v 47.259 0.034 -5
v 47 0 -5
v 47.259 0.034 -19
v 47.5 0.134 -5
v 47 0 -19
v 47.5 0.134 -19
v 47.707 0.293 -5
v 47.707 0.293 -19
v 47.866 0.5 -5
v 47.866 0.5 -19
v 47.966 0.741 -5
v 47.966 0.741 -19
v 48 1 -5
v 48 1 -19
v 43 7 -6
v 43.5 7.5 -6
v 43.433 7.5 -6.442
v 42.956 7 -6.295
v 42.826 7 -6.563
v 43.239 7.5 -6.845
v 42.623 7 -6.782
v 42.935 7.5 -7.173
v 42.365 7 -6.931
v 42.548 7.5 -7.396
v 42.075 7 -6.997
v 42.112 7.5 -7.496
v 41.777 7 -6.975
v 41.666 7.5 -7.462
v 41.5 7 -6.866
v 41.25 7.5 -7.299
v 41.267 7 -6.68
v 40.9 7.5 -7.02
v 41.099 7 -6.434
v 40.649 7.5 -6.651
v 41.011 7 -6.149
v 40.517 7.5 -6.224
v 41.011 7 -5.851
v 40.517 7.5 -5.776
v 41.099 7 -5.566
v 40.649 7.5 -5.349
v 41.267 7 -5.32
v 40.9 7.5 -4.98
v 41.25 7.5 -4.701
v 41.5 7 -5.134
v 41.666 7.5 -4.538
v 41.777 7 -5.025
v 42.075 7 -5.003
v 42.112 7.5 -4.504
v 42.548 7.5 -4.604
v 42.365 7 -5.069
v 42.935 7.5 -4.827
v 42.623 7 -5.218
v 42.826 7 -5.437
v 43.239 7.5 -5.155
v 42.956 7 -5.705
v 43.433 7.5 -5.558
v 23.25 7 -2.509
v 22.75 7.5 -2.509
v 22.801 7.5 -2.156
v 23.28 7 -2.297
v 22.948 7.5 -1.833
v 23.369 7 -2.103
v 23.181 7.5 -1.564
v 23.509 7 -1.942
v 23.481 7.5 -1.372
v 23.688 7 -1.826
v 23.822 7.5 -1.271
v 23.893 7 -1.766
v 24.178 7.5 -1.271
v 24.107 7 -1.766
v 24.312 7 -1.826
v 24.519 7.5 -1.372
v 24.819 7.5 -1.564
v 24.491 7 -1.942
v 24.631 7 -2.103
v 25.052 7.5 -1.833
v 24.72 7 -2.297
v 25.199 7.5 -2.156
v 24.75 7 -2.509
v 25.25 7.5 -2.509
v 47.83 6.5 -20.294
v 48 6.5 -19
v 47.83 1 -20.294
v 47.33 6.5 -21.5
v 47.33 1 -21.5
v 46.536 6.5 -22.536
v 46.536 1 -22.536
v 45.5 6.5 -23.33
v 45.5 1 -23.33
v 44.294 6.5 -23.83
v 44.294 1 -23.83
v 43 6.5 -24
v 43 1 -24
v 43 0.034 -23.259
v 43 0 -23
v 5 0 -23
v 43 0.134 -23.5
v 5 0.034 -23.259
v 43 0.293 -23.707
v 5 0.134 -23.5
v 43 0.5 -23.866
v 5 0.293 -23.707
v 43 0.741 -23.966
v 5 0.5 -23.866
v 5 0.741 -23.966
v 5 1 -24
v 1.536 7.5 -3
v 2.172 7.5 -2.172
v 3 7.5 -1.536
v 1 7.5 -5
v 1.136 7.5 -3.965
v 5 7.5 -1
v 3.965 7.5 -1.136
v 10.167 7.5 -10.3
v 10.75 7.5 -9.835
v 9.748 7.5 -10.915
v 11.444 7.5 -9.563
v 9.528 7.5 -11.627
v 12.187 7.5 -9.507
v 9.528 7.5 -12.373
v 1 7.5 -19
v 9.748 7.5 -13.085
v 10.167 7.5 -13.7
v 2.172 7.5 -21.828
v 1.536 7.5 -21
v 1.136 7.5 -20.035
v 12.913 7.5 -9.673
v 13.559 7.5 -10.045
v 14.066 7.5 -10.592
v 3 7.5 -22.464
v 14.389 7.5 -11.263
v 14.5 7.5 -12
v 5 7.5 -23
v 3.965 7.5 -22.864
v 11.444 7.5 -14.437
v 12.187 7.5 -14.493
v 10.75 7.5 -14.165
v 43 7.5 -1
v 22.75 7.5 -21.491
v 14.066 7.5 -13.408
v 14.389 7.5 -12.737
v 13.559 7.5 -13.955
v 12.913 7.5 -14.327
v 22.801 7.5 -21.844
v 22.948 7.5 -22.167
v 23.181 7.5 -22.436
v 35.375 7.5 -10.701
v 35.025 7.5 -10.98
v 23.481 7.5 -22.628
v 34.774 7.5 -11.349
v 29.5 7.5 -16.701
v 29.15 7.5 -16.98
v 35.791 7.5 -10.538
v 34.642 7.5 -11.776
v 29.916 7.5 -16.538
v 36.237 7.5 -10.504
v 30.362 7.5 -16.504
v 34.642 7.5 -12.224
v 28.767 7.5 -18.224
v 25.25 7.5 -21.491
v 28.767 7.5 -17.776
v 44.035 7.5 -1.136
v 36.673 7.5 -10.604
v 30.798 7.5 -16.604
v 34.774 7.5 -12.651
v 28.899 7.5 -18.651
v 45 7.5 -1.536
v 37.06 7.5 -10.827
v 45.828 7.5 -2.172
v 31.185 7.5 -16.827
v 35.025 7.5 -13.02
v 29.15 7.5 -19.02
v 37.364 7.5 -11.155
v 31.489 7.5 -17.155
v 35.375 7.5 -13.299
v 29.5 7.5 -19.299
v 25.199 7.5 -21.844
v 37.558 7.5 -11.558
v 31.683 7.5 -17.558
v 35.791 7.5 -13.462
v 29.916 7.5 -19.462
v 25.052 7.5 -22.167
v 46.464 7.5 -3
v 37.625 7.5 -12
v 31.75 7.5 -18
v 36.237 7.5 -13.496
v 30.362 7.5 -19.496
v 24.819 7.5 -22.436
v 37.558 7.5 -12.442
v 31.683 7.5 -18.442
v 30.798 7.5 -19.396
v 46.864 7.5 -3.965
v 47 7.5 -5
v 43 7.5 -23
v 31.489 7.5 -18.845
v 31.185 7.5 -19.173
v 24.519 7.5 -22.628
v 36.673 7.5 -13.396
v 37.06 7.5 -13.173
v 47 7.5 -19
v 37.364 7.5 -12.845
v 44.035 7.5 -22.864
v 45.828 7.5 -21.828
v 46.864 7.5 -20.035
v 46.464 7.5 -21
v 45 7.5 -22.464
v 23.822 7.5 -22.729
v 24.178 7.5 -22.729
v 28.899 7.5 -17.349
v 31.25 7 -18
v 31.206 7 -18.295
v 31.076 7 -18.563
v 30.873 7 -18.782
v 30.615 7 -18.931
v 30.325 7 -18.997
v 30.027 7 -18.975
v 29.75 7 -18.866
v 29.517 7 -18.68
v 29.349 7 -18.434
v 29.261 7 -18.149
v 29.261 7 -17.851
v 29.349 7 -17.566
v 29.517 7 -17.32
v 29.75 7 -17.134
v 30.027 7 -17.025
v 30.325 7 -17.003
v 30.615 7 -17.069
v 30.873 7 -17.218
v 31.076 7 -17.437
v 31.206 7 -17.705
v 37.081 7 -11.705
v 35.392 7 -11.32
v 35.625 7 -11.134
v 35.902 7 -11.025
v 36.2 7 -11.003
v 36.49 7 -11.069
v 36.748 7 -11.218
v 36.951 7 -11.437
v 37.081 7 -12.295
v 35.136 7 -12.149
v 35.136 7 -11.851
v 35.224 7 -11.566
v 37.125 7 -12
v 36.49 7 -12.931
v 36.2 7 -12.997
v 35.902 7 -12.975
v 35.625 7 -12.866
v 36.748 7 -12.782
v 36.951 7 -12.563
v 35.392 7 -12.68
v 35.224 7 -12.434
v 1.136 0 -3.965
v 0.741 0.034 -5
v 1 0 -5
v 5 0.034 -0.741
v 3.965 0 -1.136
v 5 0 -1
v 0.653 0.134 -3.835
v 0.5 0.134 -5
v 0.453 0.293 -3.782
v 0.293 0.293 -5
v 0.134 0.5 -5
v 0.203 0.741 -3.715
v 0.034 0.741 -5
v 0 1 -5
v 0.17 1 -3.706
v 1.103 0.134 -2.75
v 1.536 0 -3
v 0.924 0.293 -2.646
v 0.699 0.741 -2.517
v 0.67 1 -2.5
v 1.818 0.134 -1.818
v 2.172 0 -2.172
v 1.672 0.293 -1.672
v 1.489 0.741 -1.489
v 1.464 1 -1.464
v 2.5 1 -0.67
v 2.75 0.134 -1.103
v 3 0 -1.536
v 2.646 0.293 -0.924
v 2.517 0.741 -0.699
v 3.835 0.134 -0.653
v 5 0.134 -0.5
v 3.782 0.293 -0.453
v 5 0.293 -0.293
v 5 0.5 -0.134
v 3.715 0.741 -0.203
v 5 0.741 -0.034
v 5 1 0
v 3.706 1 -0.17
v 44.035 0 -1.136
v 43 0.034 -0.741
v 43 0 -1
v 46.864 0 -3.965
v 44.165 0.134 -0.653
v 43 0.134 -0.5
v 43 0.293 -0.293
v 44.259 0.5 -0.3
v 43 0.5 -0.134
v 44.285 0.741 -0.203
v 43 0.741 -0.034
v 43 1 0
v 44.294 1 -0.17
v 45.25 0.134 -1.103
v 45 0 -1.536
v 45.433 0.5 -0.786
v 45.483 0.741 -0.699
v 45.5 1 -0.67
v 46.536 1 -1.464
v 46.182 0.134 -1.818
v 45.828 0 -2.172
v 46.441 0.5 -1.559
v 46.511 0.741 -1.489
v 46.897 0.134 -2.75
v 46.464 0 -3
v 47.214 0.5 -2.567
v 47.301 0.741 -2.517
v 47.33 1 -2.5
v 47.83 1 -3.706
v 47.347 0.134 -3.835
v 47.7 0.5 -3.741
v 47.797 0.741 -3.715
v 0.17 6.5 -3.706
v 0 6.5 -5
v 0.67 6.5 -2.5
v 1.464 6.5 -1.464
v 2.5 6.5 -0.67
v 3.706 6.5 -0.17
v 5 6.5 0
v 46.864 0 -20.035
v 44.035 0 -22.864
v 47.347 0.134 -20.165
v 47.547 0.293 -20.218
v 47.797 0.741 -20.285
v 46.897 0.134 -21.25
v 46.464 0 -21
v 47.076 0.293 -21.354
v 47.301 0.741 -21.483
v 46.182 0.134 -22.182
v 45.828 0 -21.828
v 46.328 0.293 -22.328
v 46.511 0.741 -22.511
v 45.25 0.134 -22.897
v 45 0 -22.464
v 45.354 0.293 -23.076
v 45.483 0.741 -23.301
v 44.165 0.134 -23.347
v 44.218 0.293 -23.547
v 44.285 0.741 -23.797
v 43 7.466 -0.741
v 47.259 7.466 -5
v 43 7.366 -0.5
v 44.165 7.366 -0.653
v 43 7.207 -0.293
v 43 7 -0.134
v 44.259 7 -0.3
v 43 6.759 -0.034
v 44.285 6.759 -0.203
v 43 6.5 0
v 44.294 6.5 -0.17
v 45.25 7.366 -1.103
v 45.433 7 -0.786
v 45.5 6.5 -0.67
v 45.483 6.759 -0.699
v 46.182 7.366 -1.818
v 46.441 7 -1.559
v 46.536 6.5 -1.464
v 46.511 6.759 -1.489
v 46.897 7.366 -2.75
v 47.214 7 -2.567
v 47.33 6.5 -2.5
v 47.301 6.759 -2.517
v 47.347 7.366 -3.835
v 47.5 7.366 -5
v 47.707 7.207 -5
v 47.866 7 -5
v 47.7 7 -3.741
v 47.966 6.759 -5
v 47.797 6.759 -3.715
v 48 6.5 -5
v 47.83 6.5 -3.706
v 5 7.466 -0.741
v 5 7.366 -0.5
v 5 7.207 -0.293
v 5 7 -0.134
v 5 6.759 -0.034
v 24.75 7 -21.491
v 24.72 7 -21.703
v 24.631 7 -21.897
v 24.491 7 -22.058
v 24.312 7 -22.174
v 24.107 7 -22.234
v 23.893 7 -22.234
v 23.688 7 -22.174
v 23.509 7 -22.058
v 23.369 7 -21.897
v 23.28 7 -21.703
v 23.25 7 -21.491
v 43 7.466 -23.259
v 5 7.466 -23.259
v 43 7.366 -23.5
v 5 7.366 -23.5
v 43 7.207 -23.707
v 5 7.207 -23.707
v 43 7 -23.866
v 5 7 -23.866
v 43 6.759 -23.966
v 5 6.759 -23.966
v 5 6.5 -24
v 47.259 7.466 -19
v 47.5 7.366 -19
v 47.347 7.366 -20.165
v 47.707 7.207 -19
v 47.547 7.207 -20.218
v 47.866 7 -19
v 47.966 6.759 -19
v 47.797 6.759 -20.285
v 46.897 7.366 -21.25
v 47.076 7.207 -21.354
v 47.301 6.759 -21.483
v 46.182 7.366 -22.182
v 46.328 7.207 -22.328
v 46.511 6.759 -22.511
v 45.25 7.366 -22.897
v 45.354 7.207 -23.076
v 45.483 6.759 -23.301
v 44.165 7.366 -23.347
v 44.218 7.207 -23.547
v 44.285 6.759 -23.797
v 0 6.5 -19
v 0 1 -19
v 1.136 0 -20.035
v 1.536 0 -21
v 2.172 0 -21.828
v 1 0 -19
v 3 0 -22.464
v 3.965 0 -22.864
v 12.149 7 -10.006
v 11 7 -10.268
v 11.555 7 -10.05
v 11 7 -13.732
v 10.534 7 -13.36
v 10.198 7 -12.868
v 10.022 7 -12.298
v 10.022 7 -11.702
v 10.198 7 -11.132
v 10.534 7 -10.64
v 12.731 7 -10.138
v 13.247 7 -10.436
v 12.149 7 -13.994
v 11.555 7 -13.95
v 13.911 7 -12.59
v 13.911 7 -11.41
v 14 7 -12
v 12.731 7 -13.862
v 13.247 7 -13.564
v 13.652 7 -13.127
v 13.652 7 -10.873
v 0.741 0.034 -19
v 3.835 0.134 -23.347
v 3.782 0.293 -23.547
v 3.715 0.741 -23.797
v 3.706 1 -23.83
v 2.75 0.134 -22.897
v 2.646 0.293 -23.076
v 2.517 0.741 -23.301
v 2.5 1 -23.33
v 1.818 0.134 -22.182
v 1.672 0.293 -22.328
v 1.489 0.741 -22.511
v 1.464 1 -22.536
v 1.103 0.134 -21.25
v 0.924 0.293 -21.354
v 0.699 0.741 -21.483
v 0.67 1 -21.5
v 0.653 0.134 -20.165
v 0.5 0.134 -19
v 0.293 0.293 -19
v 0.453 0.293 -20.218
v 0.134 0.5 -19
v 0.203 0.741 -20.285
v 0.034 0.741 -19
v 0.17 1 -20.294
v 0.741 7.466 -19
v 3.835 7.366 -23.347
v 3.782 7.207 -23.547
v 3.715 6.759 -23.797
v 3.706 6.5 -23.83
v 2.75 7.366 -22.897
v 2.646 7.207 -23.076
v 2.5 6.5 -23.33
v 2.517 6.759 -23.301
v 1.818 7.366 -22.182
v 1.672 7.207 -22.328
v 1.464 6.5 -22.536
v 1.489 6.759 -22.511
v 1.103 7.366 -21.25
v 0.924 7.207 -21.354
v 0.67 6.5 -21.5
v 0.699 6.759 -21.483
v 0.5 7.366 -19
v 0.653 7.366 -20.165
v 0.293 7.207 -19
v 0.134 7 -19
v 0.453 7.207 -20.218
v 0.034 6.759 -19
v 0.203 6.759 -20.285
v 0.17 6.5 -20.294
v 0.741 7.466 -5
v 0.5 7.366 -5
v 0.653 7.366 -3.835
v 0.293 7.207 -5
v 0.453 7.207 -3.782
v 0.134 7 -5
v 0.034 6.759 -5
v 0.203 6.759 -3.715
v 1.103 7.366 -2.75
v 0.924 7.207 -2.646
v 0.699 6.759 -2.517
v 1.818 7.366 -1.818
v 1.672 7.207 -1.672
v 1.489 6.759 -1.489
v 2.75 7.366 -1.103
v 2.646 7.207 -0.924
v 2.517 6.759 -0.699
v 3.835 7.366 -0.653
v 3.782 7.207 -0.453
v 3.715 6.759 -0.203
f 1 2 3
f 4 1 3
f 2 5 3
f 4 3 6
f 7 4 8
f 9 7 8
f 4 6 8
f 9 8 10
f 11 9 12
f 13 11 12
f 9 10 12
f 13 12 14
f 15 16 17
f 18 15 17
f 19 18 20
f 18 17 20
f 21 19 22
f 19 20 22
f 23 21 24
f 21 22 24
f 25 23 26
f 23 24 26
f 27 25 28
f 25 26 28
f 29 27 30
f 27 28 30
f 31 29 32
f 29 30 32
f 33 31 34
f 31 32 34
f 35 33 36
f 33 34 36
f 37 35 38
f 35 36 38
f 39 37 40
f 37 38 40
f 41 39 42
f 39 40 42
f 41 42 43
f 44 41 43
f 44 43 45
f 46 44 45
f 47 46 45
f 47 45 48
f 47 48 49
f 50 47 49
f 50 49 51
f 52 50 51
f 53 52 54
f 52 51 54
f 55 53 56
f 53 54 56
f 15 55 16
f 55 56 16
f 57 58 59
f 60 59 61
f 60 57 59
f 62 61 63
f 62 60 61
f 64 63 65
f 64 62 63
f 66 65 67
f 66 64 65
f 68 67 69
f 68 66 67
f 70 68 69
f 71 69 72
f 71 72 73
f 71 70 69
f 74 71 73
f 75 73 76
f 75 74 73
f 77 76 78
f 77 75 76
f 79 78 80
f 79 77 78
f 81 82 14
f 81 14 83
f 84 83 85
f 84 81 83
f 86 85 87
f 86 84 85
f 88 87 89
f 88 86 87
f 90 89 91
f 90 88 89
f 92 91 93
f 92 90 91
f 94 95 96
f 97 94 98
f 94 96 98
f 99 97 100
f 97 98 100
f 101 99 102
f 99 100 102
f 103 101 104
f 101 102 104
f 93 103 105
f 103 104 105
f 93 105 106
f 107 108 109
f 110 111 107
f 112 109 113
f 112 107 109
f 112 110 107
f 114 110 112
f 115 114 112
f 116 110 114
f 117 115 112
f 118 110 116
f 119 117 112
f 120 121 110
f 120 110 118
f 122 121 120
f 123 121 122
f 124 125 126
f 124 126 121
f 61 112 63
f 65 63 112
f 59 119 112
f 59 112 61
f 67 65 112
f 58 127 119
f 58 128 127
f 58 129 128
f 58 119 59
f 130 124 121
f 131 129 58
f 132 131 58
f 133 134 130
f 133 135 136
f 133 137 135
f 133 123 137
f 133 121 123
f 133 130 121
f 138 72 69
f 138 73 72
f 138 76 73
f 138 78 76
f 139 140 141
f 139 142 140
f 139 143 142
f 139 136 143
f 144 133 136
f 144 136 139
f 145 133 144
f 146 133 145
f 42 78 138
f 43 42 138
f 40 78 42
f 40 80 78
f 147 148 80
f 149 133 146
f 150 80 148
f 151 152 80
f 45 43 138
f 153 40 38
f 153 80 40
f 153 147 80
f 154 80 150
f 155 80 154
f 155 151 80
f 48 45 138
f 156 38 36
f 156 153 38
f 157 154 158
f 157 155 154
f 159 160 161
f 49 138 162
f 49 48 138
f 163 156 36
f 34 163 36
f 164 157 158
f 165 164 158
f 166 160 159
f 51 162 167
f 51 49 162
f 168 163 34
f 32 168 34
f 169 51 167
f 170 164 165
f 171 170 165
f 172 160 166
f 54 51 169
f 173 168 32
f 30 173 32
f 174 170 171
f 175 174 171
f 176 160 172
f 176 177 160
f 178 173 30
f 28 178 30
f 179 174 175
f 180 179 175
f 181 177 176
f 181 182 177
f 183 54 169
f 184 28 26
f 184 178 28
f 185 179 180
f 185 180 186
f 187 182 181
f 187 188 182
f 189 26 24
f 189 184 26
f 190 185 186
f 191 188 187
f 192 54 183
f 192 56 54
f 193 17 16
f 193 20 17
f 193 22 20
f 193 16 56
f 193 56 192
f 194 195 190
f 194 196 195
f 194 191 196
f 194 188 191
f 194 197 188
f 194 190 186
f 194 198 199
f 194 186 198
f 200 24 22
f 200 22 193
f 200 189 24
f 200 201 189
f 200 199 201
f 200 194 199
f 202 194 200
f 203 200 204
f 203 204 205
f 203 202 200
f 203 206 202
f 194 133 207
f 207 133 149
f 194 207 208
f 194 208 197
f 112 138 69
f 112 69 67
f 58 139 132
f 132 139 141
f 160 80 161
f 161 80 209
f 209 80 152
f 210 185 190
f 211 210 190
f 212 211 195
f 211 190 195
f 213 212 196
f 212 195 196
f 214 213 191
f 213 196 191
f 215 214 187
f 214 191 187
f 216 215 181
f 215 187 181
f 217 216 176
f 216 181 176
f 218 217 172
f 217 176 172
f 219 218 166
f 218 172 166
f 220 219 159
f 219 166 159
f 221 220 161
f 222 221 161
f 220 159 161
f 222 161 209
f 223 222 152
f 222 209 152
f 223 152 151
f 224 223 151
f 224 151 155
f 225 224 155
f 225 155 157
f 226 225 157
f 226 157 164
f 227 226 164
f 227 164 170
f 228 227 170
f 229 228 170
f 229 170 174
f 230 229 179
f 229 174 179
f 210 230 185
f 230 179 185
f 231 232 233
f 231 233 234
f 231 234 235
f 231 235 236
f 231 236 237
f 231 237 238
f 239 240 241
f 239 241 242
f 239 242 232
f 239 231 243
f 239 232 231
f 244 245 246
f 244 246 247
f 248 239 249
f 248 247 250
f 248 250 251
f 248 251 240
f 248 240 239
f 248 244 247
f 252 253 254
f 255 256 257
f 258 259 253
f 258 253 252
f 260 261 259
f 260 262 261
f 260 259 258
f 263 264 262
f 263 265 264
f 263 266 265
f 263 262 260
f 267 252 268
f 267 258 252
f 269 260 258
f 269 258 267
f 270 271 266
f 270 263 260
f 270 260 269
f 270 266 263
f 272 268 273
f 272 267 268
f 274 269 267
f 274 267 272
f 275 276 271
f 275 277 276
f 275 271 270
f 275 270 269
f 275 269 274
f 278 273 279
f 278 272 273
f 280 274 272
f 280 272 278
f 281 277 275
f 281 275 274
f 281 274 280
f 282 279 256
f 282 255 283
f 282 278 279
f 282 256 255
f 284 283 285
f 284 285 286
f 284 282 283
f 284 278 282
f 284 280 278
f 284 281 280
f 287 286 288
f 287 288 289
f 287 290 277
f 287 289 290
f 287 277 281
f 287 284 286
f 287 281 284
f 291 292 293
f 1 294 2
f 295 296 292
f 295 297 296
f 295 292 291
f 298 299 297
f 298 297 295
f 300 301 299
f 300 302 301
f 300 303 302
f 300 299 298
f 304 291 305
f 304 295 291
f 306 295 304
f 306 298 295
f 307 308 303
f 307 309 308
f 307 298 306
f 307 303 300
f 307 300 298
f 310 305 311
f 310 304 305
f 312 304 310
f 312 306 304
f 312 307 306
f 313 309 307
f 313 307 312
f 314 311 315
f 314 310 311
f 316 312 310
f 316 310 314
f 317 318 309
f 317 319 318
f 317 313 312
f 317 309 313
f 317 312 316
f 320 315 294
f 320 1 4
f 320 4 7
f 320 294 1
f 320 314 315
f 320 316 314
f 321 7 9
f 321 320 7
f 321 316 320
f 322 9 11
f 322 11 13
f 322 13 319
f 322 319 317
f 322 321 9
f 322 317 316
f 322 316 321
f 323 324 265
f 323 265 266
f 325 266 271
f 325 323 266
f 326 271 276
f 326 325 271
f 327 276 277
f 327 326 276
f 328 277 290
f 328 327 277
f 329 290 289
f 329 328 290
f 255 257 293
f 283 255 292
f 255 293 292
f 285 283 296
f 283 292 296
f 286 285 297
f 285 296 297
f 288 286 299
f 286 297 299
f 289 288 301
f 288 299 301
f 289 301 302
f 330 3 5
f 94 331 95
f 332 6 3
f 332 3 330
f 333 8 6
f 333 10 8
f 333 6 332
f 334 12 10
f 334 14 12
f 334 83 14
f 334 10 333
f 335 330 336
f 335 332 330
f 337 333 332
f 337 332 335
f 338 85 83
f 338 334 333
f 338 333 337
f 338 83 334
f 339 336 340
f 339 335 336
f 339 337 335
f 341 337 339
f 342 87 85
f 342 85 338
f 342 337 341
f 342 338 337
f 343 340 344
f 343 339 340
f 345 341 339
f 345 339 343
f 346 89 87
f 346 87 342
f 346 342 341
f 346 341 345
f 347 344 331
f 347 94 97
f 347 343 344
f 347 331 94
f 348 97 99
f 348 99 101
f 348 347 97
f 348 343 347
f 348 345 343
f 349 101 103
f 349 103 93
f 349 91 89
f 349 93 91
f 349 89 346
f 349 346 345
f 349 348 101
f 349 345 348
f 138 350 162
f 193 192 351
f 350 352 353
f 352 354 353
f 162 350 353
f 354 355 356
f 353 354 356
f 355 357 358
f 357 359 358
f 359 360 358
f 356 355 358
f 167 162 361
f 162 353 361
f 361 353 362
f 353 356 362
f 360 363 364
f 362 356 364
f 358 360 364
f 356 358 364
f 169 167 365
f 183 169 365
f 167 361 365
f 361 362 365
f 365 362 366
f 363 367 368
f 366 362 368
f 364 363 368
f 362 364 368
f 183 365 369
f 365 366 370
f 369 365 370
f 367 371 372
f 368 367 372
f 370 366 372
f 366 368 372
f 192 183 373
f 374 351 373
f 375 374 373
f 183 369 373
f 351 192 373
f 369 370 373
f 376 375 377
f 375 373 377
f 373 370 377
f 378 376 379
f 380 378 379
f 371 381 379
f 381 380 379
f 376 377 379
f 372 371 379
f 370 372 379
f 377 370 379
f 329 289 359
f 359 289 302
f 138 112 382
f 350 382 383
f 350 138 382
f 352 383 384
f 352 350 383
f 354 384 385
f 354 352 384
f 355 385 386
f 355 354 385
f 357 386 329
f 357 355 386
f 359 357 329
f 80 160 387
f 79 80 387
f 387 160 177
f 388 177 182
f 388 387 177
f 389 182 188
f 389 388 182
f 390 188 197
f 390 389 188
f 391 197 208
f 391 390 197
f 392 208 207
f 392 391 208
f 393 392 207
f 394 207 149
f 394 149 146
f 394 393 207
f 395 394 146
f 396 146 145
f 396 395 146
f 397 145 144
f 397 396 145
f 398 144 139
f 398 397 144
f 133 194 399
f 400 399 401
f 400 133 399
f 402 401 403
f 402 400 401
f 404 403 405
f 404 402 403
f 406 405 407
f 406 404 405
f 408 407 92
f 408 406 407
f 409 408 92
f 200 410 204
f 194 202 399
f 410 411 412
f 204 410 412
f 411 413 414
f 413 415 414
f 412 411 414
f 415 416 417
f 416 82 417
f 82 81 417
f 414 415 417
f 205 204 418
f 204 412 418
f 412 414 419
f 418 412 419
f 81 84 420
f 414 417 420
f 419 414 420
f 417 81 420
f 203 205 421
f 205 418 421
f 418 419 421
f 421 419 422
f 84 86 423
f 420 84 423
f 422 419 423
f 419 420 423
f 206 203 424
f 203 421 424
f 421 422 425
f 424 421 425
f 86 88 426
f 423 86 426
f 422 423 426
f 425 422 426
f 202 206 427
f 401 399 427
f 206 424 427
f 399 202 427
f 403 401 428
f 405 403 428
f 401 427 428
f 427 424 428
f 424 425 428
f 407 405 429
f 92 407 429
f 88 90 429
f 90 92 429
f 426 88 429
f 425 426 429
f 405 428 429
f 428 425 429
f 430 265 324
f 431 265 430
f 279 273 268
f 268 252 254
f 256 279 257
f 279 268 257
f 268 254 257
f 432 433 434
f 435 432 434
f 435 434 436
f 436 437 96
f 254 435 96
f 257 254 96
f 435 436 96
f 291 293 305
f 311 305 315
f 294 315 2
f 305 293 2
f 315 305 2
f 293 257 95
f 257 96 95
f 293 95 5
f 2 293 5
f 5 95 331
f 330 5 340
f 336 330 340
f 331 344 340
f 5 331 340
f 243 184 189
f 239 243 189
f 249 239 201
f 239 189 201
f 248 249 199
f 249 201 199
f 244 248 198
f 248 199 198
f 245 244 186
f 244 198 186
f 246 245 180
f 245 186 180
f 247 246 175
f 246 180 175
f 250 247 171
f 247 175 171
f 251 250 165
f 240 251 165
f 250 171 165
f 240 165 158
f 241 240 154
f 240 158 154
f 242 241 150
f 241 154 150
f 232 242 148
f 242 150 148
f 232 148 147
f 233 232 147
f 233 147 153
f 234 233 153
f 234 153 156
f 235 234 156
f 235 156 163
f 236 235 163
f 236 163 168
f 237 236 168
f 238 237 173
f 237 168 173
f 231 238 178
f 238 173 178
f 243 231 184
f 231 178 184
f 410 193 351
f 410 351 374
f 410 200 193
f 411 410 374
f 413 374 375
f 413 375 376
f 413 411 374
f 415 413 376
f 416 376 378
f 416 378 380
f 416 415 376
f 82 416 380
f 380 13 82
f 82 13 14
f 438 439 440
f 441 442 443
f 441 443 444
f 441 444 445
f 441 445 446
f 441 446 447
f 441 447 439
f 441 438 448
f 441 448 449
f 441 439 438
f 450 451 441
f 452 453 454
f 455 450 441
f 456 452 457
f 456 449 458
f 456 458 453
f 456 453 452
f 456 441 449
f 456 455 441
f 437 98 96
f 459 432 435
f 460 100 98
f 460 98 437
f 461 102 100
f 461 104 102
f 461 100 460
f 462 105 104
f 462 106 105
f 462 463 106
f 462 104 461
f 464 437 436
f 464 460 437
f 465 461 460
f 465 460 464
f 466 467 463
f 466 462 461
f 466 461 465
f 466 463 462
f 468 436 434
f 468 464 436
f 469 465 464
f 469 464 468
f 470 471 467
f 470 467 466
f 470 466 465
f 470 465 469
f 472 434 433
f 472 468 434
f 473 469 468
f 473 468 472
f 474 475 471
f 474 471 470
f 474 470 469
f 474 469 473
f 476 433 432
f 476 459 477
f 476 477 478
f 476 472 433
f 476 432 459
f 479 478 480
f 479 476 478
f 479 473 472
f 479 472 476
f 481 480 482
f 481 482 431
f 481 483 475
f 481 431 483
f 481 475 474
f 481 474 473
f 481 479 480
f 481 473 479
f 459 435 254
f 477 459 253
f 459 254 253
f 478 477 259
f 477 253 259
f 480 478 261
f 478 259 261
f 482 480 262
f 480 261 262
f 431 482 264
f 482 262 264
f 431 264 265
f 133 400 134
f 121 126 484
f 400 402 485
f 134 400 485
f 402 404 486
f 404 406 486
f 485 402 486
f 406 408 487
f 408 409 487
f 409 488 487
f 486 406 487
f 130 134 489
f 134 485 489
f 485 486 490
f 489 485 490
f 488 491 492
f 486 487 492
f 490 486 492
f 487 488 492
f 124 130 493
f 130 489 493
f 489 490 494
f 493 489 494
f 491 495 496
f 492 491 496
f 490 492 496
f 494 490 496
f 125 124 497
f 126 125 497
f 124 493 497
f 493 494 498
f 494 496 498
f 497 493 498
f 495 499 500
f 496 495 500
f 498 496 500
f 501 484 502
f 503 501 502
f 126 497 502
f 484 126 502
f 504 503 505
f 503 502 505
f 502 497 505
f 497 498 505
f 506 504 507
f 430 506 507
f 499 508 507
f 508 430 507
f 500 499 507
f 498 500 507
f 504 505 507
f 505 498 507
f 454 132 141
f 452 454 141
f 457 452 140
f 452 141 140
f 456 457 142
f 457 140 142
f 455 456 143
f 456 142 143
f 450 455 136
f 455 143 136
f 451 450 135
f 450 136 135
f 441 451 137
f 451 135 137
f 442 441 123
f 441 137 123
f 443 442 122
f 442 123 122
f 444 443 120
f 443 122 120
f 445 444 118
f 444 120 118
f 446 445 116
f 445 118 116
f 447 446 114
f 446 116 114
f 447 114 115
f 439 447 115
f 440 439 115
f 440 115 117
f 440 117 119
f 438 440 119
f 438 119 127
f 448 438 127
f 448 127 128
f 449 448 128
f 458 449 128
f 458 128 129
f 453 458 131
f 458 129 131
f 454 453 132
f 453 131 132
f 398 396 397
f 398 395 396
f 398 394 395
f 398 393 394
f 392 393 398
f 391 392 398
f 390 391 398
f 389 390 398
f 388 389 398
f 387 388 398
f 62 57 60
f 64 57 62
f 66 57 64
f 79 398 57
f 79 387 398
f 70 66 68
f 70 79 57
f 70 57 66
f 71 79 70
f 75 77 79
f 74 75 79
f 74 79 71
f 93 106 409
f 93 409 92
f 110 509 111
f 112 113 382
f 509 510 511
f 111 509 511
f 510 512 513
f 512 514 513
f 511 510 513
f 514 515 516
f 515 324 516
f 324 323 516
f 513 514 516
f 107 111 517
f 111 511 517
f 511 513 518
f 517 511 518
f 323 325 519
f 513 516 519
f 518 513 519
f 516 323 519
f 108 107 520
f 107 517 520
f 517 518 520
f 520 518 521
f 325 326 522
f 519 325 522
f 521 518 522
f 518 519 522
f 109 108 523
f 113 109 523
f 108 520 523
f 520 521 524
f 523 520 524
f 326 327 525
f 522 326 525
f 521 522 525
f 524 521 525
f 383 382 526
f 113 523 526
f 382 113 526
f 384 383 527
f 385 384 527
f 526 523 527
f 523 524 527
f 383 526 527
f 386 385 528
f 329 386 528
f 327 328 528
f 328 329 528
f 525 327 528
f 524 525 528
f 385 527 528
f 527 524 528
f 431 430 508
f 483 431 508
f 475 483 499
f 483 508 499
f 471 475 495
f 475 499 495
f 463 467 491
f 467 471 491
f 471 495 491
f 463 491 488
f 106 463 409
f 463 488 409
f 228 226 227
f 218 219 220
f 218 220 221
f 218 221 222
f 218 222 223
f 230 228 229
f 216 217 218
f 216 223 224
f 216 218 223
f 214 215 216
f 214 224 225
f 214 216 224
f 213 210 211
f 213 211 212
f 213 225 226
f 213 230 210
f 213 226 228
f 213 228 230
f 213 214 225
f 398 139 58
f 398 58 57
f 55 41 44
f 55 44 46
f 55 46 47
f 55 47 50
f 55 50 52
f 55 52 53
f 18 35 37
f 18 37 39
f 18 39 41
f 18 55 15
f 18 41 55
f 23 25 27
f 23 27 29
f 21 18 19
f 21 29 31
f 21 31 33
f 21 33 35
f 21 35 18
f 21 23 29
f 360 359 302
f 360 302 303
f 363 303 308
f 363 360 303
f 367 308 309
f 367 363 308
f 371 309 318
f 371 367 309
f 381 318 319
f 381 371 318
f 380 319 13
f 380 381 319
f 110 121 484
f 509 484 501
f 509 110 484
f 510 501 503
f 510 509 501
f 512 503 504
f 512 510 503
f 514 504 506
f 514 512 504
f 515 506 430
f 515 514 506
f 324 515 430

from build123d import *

# Parameters (mm, degrees)
ESQUISSE1_W                = 48
ESQUISSE1_H                = 24
EXTRUSION1_DEPTH           = 7.5
CONG_2_R                   = 5
CONG_5_R                   = 1
CONG_6_R                   = 1
ESQUISSE4_W                = 0.5
ESQUISSE4_H                = 18.982849842
EXTRUSION2_DEPTH           = 0.5
ESQUISSE5_R                = 0.25
EXTRUSION3_DEPTH           = 0.5
CHANFREIN1_SIZE            = 1
ESQUISSE9_R                = 1.5
EXTRUSION6_DEPTH           = 0.5
EXTRUSION6_DRAFT           = -45
EXTRUSION6_PROFILE_2_DEPTH = 0.5
EXTRUSION6_PROFILE_2_DRAFT = -45
EXTRUSION6_PROFILE_3_DEPTH = 0.5
EXTRUSION6_PROFILE_3_DRAFT = -45
ESQUISSE10_R               = 2.5
EXTRUSION8_DEPTH           = 0.5
EXTRUSION8_DRAFT           = -45


with BuildPart() as part:
    # Esquisse1 → Extrusion1 (new body)
    with BuildSketch(Plane(origin=(0, 0, 0), x_dir=(1, 0, 0), z_dir=(0, 1, 0))):
        with Locations((24, 12)):
            Rectangle(ESQUISSE1_W, ESQUISSE1_H)
    extrude(amount=EXTRUSION1_DEPTH)

    # Congé2
    cong_2_edges = [part.edges().sort_by_distance(p)[0] for p in [
        (0, 3.75, -24),
        (48, 3.75, -24),
        (48, 3.75, 0),
        (0, 3.75, 0),
    ]]
    fillet(cong_2_edges, radius=CONG_2_R)

    # Congé5
    cong_5_edges = [part.edges().sort_by_distance(p)[0] for p in [
        (48, 7.5, -12),
        (24, 7.5, 0),
        (0, 7.5, -12),
        (24, 7.5, -24),
        (1.464466094, 7.5, -22.535533906),
        (1.464466094, 7.5, -1.464466094),
        (46.535533906, 7.5, -22.535533906),
        (46.535533906, 7.5, -1.464466094),
    ]]
    fillet(cong_5_edges, radius=CONG_5_R)

    # Congé6
    cong_6_edges = [part.edges().sort_by_distance(p)[0] for p in [
        (48, 0, -12),
        (0, 0, -12),
        (24, 0, -24),
        (24, 0, 0),
        (1.464466094, 0, -22.535533906),
        (1.464466094, 0, -1.464466094),
        (46.535533906, 0, -22.535533906),
        (46.535533906, 0, -1.464466094),
    ]]
    fillet(cong_6_edges, radius=CONG_6_R)

    # Esquisse4 → Extrusion2 (cut)
    with BuildSketch(Plane(origin=(0, 7.5, 0), x_dir=(1, 0, 0), z_dir=(0, 1, 0))):
        with Locations((24, 12)):
            Rectangle(ESQUISSE4_W, ESQUISSE4_H)
    extrude(amount=-EXTRUSION2_DEPTH, mode=Mode.SUBTRACT)

    # Esquisse5 → Extrusion3 (cut)
    with BuildSketch(Plane(origin=(0, 7.5, 0), x_dir=(1, 0, 0), z_dir=(0, 1, 0))):
        with Locations((24, 21.491424921)):
            Circle(ESQUISSE5_R)
        with Locations((24, 2.508575079)):
            Circle(ESQUISSE5_R)
    extrude(amount=-EXTRUSION3_DEPTH, mode=Mode.SUBTRACT)

    # Chanfrein1
    # the kernel refuses this chamfer: 1 mm, written as the material it takes off along each edge
    with BuildSketch(Plane(origin=(24, 7.5, -21.491424921), x_dir=(1, 0, 0), z_dir=(0, 0, 1))) as chanfrein1_piece_1_section:
        Polygon((0.25 + CHANFREIN1_SIZE, 0), (0.25, -CHANFREIN1_SIZE), (0.25, 0), align=None)
    chanfrein1_piece_1 = revolve(axis=Axis((24, 7.5, -21.491424921), (0, 1, 0)), revolution_arc=180, mode=Mode.PRIVATE)
    chanfrein1_piece_1 = split(chanfrein1_piece_1, bisect_by=Plane(origin=(24, 7, -21.964580549), z_dir=(0, 1, 0)), keep=Keep.TOP, mode=Mode.PRIVATE)
    add(chanfrein1_piece_1, mode=Mode.SUBTRACT)
    with BuildSketch(Plane(origin=(24.25, 7.5, -21.491424921), x_dir=(0.9996219169112968, 0.02749587661058651, 0), z_dir=(0, 0, 1))) as chanfrein1_piece_2_section:
        Polygon((CHANFREIN1_SIZE * 0.999621916911, -CHANFREIN1_SIZE * 0.0274958766106), (-CHANFREIN1_SIZE * 0.0274958766106, -CHANFREIN1_SIZE * 0.999621916911), (0, 0), align=None)
    chanfrein1_piece_2 = extrude(amount=18.982849842, mode=Mode.PRIVATE)
    chanfrein1_piece_2 = split(chanfrein1_piece_2, bisect_by=Plane(origin=(24.643401084, 7, -12), z_dir=(0, 1, 0)), keep=Keep.TOP, mode=Mode.PRIVATE)
    add(chanfrein1_piece_2, mode=Mode.SUBTRACT)
    with BuildSketch(Plane(origin=(24, 7.5, -2.508575079), x_dir=(-1, 0, 0), z_dir=(0, 0, -1))) as chanfrein1_piece_3_section:
        Polygon((0.25 + CHANFREIN1_SIZE, 0), (0.25, -CHANFREIN1_SIZE), (0.25, 0), align=None)
    chanfrein1_piece_3 = revolve(axis=Axis((24, 7.5, -2.508575079), (0, 1, 0)), revolution_arc=180, mode=Mode.PRIVATE)
    chanfrein1_piece_3 = split(chanfrein1_piece_3, bisect_by=Plane(origin=(24, 7, -2.035419451), z_dir=(0, 1, 0)), keep=Keep.TOP, mode=Mode.PRIVATE)
    add(chanfrein1_piece_3, mode=Mode.SUBTRACT)
    with BuildSketch(Plane(origin=(23.75, 7.5, -2.508575079), x_dir=(-0.9996219169112968, 0.02749587661058651, 0), z_dir=(0, 0, -1))) as chanfrein1_piece_4_section:
        Polygon((CHANFREIN1_SIZE * 0.999621916911, -CHANFREIN1_SIZE * 0.0274958766106), (-CHANFREIN1_SIZE * 0.0274958766106, -CHANFREIN1_SIZE * 0.999621916911), (0, 0), align=None)
    chanfrein1_piece_4 = extrude(amount=18.982849842, mode=Mode.PRIVATE)
    chanfrein1_piece_4 = split(chanfrein1_piece_4, bisect_by=Plane(origin=(23.356598916, 7, -12), z_dir=(0, 1, 0)), keep=Keep.TOP, mode=Mode.PRIVATE)
    add(chanfrein1_piece_4, mode=Mode.SUBTRACT)


with BuildPart() as extrusion6_tool:
    # Esquisse9 → Extrusion6 (with draft: the straight prism first)
    with BuildSketch(Plane(origin=(0, 7.5, 0), x_dir=(1, 0, 0), z_dir=(0, 1, 0))):
        with Locations((30.25, 18)):
            Circle(ESQUISSE9_R)
    extrude(amount=-EXTRUSION6_DEPTH)
    # Extrusion6: the draft: its side faces are tilted about the plane it starts from
    extrusion6_sides = [extrusion6_tool.faces().sort_by_distance(p)[0] for p in [
        (28.75, 7.25, -18),
    ]]
    draft(extrusion6_sides, Plane(origin=(0, 7.5, 0), x_dir=(1, 0, 0), z_dir=(0, 1, 0)), EXTRUSION6_DRAFT)


with BuildPart() as part_1:
    add(part.part)

    # Extrusion6: cut by extrusion6_tool
    add(extrusion6_tool.part, mode=Mode.SUBTRACT)


with BuildPart() as extrusion6_profile_2_tool:
    # Esquisse9 → Extrusion6 profile 2 (with draft: the straight prism first)
    with BuildSketch(Plane(origin=(0, 7.5, 0), x_dir=(1, 0, 0), z_dir=(0, 1, 0))):
        with Locations((36.125, 12)):
            Circle(ESQUISSE9_R)
    extrude(amount=-EXTRUSION6_PROFILE_2_DEPTH)
    # Extrusion6 profile 2: the draft: its side faces are tilted about the plane it starts from
    extrusion6_profile_2_sides = [extrusion6_profile_2_tool.faces().sort_by_distance(p)[0] for p in [
        (34.625, 7.25, -12),
    ]]
    draft(extrusion6_profile_2_sides, Plane(origin=(0, 7.5, 0), x_dir=(1, 0, 0), z_dir=(0, 1, 0)), EXTRUSION6_PROFILE_2_DRAFT)


with BuildPart() as part_2:
    add(part_1.part)

    # Extrusion6 profile 2: cut by extrusion6_profile_2_tool
    add(extrusion6_profile_2_tool.part, mode=Mode.SUBTRACT)


with BuildPart() as extrusion6_profile_3_tool:
    # Esquisse9 → Extrusion6 profile 3 (with draft: the straight prism first)
    with BuildSketch(Plane(origin=(0, 7.5, 0), x_dir=(1, 0, 0), z_dir=(0, 1, 0))):
        with Locations((42, 6)):
            Circle(ESQUISSE9_R)
    extrude(amount=-EXTRUSION6_PROFILE_3_DEPTH)
    # Extrusion6 profile 3: the draft: its side faces are tilted about the plane it starts from
    extrusion6_profile_3_sides = [extrusion6_profile_3_tool.faces().sort_by_distance(p)[0] for p in [
        (40.5, 7.25, -6),
    ]]
    draft(extrusion6_profile_3_sides, Plane(origin=(0, 7.5, 0), x_dir=(1, 0, 0), z_dir=(0, 1, 0)), EXTRUSION6_PROFILE_3_DRAFT)


with BuildPart() as part_3:
    add(part_2.part)

    # Extrusion6 profile 3: cut by extrusion6_profile_3_tool
    add(extrusion6_profile_3_tool.part, mode=Mode.SUBTRACT)


with BuildPart() as extrusion8_tool:
    # Esquisse10 → Extrusion8 (with draft: the straight prism first)
    with BuildSketch(Plane(origin=(0, 7.5, 0), x_dir=(1, 0, 0), z_dir=(0, 1, 0))):
        with Locations((12, 12)):
            Circle(ESQUISSE10_R)
    extrude(amount=-EXTRUSION8_DEPTH)
    # Extrusion8: the draft: its side faces are tilted about the plane it starts from
    extrusion8_sides = [extrusion8_tool.faces().sort_by_distance(p)[0] for p in [
        (9.5, 7.25, -12),
    ]]
    draft(extrusion8_sides, Plane(origin=(0, 7.5, 0), x_dir=(1, 0, 0), z_dir=(0, 1, 0)), EXTRUSION8_DRAFT)


with BuildPart() as part_4:
    add(part_3.part)

    # Extrusion8: cut by extrusion8_tool
    add(extrusion8_tool.part, mode=Mode.SUBTRACT)


solid = part_4.part
